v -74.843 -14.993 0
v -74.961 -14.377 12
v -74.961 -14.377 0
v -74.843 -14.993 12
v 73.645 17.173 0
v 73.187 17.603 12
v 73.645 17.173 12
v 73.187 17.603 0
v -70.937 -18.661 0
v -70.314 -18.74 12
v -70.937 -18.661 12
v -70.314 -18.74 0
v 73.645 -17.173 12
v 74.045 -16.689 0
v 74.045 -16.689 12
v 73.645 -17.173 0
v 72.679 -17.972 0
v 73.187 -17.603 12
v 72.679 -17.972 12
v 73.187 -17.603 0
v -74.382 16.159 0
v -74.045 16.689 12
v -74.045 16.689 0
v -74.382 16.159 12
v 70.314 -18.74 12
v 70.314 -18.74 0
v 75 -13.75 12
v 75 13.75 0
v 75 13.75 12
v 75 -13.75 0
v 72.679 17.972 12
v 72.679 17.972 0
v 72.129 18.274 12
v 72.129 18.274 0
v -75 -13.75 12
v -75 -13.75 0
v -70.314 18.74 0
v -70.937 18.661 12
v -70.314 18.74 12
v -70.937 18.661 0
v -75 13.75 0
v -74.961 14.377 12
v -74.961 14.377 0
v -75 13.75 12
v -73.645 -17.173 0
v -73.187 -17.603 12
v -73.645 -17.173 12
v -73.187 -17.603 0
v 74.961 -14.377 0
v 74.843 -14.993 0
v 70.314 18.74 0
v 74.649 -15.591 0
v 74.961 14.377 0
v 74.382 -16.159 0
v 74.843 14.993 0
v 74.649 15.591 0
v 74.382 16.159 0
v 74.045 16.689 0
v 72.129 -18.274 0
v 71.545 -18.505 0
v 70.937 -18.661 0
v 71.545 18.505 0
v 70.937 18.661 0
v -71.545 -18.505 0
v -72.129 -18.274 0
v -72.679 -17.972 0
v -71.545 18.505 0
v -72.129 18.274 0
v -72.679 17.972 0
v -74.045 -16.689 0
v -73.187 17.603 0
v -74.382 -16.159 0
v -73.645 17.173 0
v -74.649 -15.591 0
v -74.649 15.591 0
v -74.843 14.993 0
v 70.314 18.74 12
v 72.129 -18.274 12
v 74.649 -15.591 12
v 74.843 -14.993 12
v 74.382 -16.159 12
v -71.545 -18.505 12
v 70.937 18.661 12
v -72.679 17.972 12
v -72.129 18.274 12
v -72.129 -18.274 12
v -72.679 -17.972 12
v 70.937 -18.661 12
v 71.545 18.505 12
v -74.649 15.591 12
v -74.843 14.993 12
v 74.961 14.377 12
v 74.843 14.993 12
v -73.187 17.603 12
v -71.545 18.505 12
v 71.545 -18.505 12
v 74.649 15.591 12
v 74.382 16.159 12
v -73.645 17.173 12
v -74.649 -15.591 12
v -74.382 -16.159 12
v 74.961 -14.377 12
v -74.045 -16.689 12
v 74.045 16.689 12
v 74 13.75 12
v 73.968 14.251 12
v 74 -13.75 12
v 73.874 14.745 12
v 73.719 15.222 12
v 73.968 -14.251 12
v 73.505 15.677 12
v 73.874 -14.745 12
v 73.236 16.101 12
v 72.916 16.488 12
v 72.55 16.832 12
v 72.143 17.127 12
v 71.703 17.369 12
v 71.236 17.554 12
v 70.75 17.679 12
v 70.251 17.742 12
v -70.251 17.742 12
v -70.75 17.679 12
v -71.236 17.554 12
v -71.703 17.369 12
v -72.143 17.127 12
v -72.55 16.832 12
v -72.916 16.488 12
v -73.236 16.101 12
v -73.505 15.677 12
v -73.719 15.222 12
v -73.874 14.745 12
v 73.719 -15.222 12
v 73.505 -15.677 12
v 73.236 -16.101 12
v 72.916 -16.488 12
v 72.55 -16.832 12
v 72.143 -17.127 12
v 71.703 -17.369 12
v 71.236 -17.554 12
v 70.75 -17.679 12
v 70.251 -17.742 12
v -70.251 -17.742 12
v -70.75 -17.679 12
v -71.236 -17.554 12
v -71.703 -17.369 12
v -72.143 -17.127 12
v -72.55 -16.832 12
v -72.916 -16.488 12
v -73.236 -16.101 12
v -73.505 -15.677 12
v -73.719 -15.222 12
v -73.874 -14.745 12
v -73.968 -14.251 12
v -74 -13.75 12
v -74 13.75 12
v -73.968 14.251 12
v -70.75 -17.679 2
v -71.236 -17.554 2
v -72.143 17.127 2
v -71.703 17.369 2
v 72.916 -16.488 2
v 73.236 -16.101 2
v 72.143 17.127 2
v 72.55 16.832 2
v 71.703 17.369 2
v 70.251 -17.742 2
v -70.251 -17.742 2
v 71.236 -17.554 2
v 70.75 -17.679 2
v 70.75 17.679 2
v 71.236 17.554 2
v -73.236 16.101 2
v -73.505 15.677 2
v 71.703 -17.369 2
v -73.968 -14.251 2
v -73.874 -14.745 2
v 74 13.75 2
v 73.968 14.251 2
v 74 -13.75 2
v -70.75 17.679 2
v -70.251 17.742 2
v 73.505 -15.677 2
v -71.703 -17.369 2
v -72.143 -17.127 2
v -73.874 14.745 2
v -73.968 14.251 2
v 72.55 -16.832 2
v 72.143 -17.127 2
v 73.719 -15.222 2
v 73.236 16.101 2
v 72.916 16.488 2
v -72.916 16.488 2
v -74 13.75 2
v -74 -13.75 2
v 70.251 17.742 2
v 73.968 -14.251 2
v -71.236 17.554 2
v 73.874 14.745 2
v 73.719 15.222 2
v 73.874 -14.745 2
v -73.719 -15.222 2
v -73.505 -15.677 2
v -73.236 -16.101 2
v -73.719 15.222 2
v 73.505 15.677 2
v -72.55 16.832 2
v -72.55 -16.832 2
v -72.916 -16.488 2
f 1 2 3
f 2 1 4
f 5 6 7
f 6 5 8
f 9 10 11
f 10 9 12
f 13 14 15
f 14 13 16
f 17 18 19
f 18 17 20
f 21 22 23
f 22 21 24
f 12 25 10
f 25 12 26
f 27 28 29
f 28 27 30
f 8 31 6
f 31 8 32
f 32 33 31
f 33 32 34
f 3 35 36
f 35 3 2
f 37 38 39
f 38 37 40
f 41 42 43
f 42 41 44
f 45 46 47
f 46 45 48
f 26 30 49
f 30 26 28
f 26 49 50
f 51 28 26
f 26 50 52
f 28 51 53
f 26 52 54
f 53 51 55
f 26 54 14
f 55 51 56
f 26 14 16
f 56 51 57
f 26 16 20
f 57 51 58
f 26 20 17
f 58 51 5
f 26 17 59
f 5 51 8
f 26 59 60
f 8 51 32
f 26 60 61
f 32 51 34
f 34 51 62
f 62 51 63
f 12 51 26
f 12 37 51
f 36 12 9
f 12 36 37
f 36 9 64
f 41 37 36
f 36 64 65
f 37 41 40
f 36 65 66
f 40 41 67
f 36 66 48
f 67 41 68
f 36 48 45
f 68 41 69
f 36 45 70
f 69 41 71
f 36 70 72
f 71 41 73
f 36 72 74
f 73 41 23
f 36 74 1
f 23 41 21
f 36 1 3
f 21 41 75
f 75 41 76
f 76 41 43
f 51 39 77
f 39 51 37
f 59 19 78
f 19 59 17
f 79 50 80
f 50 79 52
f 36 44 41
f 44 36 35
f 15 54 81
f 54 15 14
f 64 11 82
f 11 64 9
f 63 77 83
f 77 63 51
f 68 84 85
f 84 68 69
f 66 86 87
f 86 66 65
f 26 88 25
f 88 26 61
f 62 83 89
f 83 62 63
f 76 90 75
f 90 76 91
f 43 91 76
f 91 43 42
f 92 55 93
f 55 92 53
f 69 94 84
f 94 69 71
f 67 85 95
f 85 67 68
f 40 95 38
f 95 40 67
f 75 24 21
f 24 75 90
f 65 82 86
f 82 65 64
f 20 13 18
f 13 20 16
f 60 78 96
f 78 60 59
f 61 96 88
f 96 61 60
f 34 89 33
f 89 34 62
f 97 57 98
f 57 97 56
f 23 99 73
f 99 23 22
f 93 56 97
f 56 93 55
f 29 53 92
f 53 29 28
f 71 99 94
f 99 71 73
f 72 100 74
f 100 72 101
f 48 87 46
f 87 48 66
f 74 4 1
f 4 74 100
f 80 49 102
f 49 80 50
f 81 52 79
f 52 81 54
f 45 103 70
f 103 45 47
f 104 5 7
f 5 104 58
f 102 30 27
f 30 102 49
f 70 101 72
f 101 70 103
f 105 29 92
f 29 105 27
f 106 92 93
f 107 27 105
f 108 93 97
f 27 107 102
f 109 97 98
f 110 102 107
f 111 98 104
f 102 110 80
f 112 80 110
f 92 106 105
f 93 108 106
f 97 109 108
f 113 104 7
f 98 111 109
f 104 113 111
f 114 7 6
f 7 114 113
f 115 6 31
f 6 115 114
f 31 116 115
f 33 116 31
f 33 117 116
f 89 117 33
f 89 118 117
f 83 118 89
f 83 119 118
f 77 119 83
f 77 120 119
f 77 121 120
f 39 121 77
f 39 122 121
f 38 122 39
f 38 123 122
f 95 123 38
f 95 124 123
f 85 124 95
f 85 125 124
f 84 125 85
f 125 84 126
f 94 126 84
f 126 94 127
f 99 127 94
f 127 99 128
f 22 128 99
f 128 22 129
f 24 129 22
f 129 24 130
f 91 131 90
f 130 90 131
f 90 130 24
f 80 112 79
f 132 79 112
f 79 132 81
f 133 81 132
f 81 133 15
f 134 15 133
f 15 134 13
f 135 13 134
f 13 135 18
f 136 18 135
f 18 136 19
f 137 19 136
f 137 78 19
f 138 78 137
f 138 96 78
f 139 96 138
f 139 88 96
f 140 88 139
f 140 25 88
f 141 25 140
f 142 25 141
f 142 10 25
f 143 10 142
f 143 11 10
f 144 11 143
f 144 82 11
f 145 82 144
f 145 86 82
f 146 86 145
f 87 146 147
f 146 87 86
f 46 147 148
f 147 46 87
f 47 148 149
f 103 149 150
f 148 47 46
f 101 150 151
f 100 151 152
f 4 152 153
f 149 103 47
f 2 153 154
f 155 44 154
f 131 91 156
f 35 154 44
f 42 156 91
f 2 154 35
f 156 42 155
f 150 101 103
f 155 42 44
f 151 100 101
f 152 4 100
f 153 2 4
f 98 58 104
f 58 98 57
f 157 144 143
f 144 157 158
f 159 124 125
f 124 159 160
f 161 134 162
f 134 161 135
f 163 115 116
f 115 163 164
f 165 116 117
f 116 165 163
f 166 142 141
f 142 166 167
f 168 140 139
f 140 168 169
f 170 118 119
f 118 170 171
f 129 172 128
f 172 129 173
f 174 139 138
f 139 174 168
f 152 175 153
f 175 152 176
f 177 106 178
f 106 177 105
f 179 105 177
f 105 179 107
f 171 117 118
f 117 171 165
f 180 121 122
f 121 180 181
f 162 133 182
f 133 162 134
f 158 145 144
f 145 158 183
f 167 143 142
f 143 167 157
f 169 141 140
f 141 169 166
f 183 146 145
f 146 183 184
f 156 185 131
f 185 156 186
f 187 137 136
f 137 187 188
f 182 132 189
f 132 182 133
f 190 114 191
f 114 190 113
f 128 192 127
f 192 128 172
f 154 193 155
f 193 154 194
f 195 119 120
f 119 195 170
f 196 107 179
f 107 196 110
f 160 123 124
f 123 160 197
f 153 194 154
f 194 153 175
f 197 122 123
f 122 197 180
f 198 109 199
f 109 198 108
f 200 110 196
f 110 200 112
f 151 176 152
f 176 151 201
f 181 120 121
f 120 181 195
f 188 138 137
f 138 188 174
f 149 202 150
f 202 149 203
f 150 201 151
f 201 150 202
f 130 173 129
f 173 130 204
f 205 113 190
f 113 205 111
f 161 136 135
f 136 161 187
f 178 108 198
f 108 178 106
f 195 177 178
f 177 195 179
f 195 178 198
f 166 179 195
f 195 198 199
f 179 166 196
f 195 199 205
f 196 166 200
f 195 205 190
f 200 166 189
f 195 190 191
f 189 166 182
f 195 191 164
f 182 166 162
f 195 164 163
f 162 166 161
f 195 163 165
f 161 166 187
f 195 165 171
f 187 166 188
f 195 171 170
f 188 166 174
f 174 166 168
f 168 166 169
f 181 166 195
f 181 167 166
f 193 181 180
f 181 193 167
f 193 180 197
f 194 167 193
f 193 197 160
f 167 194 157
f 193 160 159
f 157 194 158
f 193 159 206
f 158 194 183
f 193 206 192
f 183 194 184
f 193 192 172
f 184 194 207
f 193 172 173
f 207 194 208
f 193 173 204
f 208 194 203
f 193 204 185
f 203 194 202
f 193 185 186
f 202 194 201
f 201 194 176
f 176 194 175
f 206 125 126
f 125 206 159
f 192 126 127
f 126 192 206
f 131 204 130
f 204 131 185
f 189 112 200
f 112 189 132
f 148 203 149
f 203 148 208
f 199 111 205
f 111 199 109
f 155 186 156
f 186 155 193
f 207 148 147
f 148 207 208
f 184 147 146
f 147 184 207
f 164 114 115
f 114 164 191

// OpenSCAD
$fn = 50;


difference() {
	union() {
		hull() {
			translate(v = [-70.0000000000, 13.7500000000, 0]) {
				cylinder(h = 12, r = 5);
			}
			translate(v = [70.0000000000, 13.7500000000, 0]) {
				cylinder(h = 12, r = 5);
			}
			translate(v = [-70.0000000000, -13.7500000000, 0]) {
				cylinder(h = 12, r = 5);
			}
			translate(v = [70.0000000000, -13.7500000000, 0]) {
				cylinder(h = 12, r = 5);
			}
		}
	}
	union() {
		translate(v = [0, 0, 2]) {
			hull() {
				translate(v = [-70.0000000000, 13.7500000000, 0]) {
					cylinder(h = 10, r = 4);
				}
				translate(v = [70.0000000000, 13.7500000000, 0]) {
					cylinder(h = 10, r = 4);
				}
				translate(v = [-70.0000000000, -13.7500000000, 0]) {
					cylinder(h = 10, r = 4);
				}
				translate(v = [70.0000000000, -13.7500000000, 0]) {
					cylinder(h = 10, r = 4);
				}
			}
		}
	}
}
